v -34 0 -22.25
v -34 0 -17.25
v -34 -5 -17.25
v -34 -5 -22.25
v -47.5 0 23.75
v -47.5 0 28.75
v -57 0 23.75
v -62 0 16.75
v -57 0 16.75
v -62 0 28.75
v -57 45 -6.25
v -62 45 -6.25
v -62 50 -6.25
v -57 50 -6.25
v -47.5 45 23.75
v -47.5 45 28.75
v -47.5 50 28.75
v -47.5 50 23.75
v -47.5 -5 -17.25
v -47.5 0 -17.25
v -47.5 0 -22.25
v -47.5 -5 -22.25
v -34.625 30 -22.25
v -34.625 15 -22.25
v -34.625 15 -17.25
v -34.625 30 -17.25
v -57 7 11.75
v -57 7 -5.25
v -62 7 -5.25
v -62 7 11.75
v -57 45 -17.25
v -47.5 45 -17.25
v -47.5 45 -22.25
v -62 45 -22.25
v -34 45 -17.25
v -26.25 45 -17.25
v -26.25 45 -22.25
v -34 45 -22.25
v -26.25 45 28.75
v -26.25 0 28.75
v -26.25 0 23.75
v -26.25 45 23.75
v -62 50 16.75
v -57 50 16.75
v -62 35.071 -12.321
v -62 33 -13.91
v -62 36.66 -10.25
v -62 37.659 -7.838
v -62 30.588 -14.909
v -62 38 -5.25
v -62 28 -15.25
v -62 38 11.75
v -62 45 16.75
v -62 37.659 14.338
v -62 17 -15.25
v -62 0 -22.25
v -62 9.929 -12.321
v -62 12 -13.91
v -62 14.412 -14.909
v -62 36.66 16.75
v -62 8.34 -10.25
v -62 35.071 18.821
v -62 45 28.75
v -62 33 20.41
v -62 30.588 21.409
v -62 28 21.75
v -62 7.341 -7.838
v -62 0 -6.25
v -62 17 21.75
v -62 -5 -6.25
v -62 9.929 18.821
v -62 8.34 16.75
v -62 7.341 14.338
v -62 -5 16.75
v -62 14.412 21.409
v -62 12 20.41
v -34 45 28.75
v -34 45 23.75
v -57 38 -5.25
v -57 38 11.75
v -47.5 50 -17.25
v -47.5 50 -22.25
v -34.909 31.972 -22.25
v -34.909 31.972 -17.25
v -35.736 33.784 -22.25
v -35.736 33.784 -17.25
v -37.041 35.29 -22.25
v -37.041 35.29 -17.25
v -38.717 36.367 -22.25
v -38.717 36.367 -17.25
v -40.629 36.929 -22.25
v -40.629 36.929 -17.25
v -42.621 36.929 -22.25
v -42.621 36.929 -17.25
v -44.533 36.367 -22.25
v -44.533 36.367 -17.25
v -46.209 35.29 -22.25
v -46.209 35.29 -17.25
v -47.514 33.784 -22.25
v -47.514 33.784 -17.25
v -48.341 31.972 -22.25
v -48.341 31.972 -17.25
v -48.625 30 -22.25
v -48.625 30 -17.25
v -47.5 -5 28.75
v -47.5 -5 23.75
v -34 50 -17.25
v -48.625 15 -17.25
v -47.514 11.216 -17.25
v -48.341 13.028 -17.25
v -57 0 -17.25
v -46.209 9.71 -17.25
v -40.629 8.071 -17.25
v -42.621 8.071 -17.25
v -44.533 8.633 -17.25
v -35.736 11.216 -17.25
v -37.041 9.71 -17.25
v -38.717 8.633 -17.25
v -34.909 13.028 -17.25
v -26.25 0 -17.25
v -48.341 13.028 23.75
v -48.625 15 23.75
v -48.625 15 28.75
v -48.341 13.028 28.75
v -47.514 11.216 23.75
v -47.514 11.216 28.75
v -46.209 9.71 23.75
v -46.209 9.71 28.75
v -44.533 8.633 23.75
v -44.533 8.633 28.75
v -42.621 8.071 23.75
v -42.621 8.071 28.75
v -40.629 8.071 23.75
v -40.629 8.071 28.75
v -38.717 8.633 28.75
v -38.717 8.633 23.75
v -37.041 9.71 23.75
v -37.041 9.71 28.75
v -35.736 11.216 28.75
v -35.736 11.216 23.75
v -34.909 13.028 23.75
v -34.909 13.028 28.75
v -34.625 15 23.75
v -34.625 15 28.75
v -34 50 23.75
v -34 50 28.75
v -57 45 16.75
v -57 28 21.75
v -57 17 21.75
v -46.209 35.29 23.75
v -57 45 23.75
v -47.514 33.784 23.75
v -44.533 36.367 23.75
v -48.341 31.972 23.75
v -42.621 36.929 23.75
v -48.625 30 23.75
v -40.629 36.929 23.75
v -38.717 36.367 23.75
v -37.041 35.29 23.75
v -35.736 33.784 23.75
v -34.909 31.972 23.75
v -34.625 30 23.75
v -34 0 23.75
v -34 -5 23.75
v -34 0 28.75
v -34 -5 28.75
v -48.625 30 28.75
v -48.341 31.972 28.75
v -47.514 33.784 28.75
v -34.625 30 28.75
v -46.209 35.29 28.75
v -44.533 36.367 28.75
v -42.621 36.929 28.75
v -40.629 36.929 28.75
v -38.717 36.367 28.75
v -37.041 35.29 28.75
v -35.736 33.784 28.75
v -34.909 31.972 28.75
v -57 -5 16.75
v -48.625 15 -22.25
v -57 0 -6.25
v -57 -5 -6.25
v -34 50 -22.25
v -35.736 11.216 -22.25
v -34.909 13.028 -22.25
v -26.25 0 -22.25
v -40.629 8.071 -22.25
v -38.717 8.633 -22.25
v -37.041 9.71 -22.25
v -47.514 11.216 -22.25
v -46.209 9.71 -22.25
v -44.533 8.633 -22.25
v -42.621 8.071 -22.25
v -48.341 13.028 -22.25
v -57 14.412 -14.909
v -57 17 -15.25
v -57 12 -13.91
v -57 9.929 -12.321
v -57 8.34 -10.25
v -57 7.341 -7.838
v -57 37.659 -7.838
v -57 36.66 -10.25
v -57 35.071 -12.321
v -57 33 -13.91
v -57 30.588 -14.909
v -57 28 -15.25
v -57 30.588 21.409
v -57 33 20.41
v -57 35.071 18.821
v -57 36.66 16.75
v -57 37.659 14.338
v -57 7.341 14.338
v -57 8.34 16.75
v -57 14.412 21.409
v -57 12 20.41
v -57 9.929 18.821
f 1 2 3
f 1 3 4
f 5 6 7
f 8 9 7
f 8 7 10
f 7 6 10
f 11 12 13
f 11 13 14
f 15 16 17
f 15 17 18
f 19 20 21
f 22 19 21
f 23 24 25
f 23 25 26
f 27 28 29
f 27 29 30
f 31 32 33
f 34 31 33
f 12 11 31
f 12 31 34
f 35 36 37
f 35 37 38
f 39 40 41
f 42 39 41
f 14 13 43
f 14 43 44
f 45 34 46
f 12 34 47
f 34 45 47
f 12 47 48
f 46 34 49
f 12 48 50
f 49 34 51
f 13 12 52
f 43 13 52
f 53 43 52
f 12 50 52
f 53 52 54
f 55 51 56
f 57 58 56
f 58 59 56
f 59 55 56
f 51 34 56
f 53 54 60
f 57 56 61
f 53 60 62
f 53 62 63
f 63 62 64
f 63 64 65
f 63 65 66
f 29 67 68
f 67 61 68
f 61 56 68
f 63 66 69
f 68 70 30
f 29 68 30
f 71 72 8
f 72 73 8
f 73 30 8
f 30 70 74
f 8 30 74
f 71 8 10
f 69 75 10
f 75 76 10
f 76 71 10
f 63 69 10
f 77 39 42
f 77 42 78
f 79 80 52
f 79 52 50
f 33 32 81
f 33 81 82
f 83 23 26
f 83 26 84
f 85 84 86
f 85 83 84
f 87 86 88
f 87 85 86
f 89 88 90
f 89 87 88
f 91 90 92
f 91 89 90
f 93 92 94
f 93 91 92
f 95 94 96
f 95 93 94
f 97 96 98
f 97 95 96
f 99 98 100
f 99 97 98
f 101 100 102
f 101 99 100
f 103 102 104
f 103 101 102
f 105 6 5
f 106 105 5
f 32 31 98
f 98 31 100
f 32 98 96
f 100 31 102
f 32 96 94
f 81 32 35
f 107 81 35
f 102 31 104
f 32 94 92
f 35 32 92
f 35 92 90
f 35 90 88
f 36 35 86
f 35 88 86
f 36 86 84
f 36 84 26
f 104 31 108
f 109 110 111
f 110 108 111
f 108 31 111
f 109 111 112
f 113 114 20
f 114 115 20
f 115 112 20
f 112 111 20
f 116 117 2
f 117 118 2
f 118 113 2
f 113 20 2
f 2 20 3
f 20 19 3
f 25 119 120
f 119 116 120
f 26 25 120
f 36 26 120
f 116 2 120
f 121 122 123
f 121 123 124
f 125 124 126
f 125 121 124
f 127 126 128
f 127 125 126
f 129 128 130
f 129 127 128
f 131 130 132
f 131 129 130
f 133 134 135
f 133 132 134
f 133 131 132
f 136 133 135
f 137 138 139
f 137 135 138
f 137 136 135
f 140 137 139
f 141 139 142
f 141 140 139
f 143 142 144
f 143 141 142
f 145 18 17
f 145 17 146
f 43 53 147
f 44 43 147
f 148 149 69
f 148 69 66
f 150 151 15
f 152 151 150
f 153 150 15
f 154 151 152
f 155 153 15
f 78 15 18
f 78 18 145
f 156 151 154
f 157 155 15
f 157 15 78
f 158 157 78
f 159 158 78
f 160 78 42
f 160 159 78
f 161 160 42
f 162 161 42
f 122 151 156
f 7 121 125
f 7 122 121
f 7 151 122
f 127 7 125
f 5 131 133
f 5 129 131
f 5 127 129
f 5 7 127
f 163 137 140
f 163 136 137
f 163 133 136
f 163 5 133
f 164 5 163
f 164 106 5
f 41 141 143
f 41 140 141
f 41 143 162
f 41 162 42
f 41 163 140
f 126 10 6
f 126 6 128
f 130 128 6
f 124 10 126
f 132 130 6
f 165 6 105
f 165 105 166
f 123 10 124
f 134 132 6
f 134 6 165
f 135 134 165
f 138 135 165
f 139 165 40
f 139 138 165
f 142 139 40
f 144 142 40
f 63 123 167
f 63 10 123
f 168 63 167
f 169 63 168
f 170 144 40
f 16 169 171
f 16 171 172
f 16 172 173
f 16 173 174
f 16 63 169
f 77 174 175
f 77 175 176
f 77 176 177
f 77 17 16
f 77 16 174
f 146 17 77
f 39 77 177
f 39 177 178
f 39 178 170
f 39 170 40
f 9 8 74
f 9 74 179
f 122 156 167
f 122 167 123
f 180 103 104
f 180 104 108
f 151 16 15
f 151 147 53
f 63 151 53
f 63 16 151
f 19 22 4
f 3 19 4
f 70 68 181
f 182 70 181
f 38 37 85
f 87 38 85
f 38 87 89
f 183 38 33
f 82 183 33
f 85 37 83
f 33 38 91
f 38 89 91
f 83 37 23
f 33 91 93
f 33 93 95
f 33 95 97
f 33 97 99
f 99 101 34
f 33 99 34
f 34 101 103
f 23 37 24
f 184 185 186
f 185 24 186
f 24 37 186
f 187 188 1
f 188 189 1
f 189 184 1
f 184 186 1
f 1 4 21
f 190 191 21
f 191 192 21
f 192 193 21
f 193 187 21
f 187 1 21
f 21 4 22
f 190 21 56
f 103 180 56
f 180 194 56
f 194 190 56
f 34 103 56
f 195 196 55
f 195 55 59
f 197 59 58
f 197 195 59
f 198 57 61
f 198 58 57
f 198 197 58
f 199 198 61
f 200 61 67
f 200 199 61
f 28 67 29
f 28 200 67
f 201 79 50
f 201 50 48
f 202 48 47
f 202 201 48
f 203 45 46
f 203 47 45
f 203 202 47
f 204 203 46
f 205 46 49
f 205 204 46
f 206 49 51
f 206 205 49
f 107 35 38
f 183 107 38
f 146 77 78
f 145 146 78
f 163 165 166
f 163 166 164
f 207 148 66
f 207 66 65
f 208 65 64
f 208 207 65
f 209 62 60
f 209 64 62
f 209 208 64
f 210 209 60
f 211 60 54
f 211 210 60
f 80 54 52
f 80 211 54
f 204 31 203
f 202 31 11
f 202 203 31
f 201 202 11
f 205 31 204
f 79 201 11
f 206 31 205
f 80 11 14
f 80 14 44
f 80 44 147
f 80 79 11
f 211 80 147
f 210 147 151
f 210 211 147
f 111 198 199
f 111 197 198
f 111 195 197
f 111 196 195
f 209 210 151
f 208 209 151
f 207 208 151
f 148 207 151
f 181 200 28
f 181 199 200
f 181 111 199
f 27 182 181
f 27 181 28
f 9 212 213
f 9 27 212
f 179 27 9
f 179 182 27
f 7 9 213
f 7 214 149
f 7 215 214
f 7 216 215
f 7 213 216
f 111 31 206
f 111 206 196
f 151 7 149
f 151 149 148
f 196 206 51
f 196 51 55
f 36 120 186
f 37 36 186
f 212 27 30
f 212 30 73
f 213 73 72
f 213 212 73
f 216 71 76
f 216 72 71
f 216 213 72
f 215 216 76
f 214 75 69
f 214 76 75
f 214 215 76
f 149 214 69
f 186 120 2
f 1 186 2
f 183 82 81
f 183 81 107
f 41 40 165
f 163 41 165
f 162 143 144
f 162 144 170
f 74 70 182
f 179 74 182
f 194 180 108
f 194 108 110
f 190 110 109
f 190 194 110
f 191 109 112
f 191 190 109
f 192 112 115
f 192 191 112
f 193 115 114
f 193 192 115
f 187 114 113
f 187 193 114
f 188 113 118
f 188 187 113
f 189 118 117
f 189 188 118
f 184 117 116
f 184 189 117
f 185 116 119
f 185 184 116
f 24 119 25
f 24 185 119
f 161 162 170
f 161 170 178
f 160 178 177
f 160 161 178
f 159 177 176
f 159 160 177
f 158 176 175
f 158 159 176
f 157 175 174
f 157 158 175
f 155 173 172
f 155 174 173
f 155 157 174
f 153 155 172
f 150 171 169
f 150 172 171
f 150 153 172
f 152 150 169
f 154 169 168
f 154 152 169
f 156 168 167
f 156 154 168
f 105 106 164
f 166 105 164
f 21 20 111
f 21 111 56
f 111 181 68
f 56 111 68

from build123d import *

# Parameters (mm, degrees)
ESQUISSE1_W                  = 52.5
ESQUISSE1_H                  = 57.5
ESQUISSE1_W_2                = 42.5
ESQUISSE1_H_2                = 47.5
EXTRU_MINCE1_DEPTH           = 20
ESQUISSE3_W                  = 6.75
ESQUISSE3_H                  = 41
ESQUISSE3_W_2                = 30.75
BOSS_EXTRU_1_DEPTH           = 45
ESQUISSE6_W                  = 5
ESQUISSE6_H                  = 23
ESQUISSE6_W_2                = 13.5
ESQUISSE6_H_2                = 5
BOSS_EXTRU_3_DEPTH           = 5
ENL_V_MAT_EXTRU_1_REACH      = 100.236
ESQUISSE2_R                  = 1.6
ENL_V_START                  = -3
ENL_V_MAT_EXTRU_2_DEPTH      = 3
CONG_1_R                     = 3
ENL_V_MAT_EXTRU_3_DEPTH      = 116.440731547
ENL_V_MAT_EXTRU_4_DEPTH      = 95.578010129
ENL_V_MAT_EXTRU_5_DEPTH      = 85.679173945
ENL_V_MAT_EXTRU_5_DEPTH_BACK = 85.679173945
ESQUISSE11_W                 = 64.25
ESQUISSE11_H                 = 72.384582196


with BuildPart() as part:
    # Esquisse1 → Extru.-Mince1 (new body)
    with BuildSketch(Plane(origin=(0, 0, 0), x_dir=(1, 0, 0), z_dir=(0, 1, 0))):
        Rectangle(ESQUISSE1_W, ESQUISSE1_H)
        Rectangle(ESQUISSE1_W_2, ESQUISSE1_H_2, mode=Mode.SUBTRACT)
    extrude(amount=EXTRU_MINCE1_DEPTH)

    # Esquisse3 → Boss.-Extru.1 (add)
    with BuildSketch(Plane.XZ):
        Polygon((26.25, 28.75), (38, 28.75), (38, -22.25), (21.25, -22.25), (21.25, 23.75), (-21.25, 23.75), (-21.25, -22.25), (-62, -22.25), (-62, 28.75), (-26.25, 28.75), (0, 28.75), align=None)
        with Locations((29.625, 3.25)):
            Rectangle(ESQUISSE3_W, ESQUISSE3_H, mode=Mode.SUBTRACT)
        with Locations((-41.625, 3.25)):
            Rectangle(ESQUISSE3_W_2, ESQUISSE3_H, mode=Mode.SUBTRACT)
    extrude(amount=-BOSS_EXTRU_1_DEPTH)

    # Esquisse6 → Boss.-Extru.3 (add)
    with BuildSketch(Plane(origin=(0, 45, 0), x_dir=(1, 0, 0), z_dir=(0, 1, 0))):
        with Locations((35.5, -5.25)):
            Rectangle(ESQUISSE6_W, ESQUISSE6_H)
        with Locations((16.25, -26.25)):
            Rectangle(ESQUISSE6_W_2, ESQUISSE6_H_2)
        with Locations((-12.25, -26.25)):
            Rectangle(ESQUISSE6_W_2, ESQUISSE6_H_2)
        with Locations((-40.75, -26.25)):
            Rectangle(ESQUISSE6_W_2, ESQUISSE6_H_2)
        with Locations((-40.75, 19.75)):
            Rectangle(ESQUISSE6_W_2, ESQUISSE6_H_2)
        with Locations((-59.5, -5.25)):
            Rectangle(ESQUISSE6_W, ESQUISSE6_H)
    boss_extru_3 = extrude(amount=BOSS_EXTRU_3_DEPTH)

    # Esquisse2 → Enlèv. mat.-Extru.1 (cut, up to next)
    with BuildSketch(Plane.XY.offset(28.75), mode=Mode.PRIVATE) as enl_v_mat_extru_1_sk1:
        with Locations((-15.5, 5.2)):
            Circle(ESQUISSE2_R)
    enl_v_mat_extru_1_tool1 = extrude(enl_v_mat_extru_1_sk1.sketch, amount=-ENL_V_MAT_EXTRU_1_REACH, mode=Mode.PRIVATE) & part.part
    # Esquisse2 → Enlèv. mat.-Extru.1 (cut, up to next)
    with BuildSketch(Plane.XY.offset(28.75), mode=Mode.PRIVATE) as enl_v_mat_extru_1_sk2:
        with Locations((15.5, 5.2)):
            Circle(ESQUISSE2_R)
    enl_v_mat_extru_1_tool2 = extrude(enl_v_mat_extru_1_sk2.sketch, amount=-ENL_V_MAT_EXTRU_1_REACH, mode=Mode.PRIVATE) & part.part
    # Esquisse2 → Enlèv. mat.-Extru.1 (cut, up to next)
    with BuildSketch(Plane.XY.offset(28.75), mode=Mode.PRIVATE) as enl_v_mat_extru_1_sk3:
        with Locations(Location((15.5, 34.8, 0), (0, 0, 180))):
            Circle(ESQUISSE2_R)
    enl_v_mat_extru_1_tool3 = extrude(enl_v_mat_extru_1_sk3.sketch, amount=-ENL_V_MAT_EXTRU_1_REACH, mode=Mode.PRIVATE) & part.part
    # Esquisse2 → Enlèv. mat.-Extru.1 (cut, up to next)
    with BuildSketch(Plane.XY.offset(28.75), mode=Mode.PRIVATE) as enl_v_mat_extru_1_sk4:
        with Locations(Location((-15.5, 34.8, 0), (0, 0, 180))):
            Circle(ESQUISSE2_R)
    enl_v_mat_extru_1_tool4 = extrude(enl_v_mat_extru_1_sk4.sketch, amount=-ENL_V_MAT_EXTRU_1_REACH, mode=Mode.PRIVATE) & part.part
    # Esquisse2 → Enlèv. mat.-Extru.1 (cut, up to next)
    with BuildSketch(Plane.XY.offset(28.75), mode=Mode.PRIVATE) as enl_v_mat_extru_1_sk5:
        with BuildLine():
            Line((2.65, 36.215870824), (2.65, 32.215870824))
            ThreePointArc((2.65, 32.215870824), (0, 7.5), (-2.65, 32.215870824))
            Line((-2.65, 32.215870824), (-2.65, 36.215870824))
            ThreePointArc((-2.65, 36.215870824), (0, 38.865870824), (2.65, 36.215870824))
        make_face()
    enl_v_mat_extru_1_tool5 = extrude(enl_v_mat_extru_1_sk5.sketch, amount=-ENL_V_MAT_EXTRU_1_REACH, mode=Mode.PRIVATE) & part.part
    add(enl_v_mat_extru_1_tool1.solids().sort_by_distance((-15.5, 5.2, 28.75))[0], mode=Mode.SUBTRACT)
    add(enl_v_mat_extru_1_tool2.solids().sort_by_distance((15.5, 5.2, 28.75))[0], mode=Mode.SUBTRACT)
    add(enl_v_mat_extru_1_tool3.solids().sort_by_distance((15.5, 34.8, 28.75))[0], mode=Mode.SUBTRACT)
    add(enl_v_mat_extru_1_tool4.solids().sort_by_distance((-15.5, 34.8, 28.75))[0], mode=Mode.SUBTRACT)
    add(enl_v_mat_extru_1_tool5.solids().sort_by_distance((0, 20.91985, 28.75))[0], mode=Mode.SUBTRACT)

    # Esquisse4 → Enlèv. mat.-Extru.2 (cut)
    with BuildSketch(Plane(origin=(0, 0, 23.75), x_dir=(-1, 0, 0), z_dir=(0, 0, -1)).offset(ENL_V_START)):
        with BuildLine():
            Line((-12.5, 20), (-12.5, 50))
            Line((-12.5, 50), (12.5, 50))
            Line((12.5, 50), (12.5, 20))
            ThreePointArc((12.5, 20), (0, 32.5), (-12.5, 20))
        make_face()
    extrude(amount=ENL_V_MAT_EXTRU_2_DEPTH, mode=Mode.SUBTRACT)

    # Symétrie1: Boss.-Extru.3 across plane
    add(boss_extru_3.mirror(Plane(origin=(0, 22.5, 0), x_dir=(0, 0, 1), z_dir=(0, -1, 0))))

    # Congé1
    cong_1_edges = [part.edges().sort_by_distance(p)[0] for p in [
        (0, 20, -23.75),
    ]]
    fillet(cong_1_edges, radius=CONG_1_R)

    # Esquisse7 → Enlèv. mat.-Extru.3 (cut, through all)
    with BuildSketch(Plane(origin=(38, 0, 0), x_dir=(0, 0, -1), z_dir=(1, 0, 0))):
        with BuildLine():
            Line((-11.75, 38), (5.25, 38))
            ThreePointArc((5.25, 38), (12.321067812, 35.071067812), (15.25, 28))
            Line((15.25, 28), (15.25, 17))
            ThreePointArc((15.25, 17), (12.321067812, 9.928932188), (5.25, 7))
            Line((5.25, 7), (-11.75, 7))
            ThreePointArc((-11.75, 7), (-18.821067812, 9.928932188), (-21.75, 17))
            Line((-21.75, 17), (-21.75, 28))
            ThreePointArc((-21.75, 28), (-18.821067812, 35.071067812), (-11.75, 38))
        make_face()
    extrude(amount=-ENL_V_MAT_EXTRU_3_DEPTH, mode=Mode.SUBTRACT)

    # Esquisse8 → Enlèv. mat.-Extru.4 (cut, through all)
    with BuildSketch(Plane(origin=(0, 0, -22.25), x_dir=(-1, 0, 0), z_dir=(0, 0, -1))):
        with BuildLine():
            Line((48.625, 30), (48.625, 15))
            ThreePointArc((48.625, 15), (41.625, 8), (34.625, 15))
            Line((34.625, 15), (34.625, 30))
            ThreePointArc((34.625, 30), (41.625, 37), (48.625, 30))
        make_face()
    extrude(amount=-ENL_V_MAT_EXTRU_4_DEPTH, mode=Mode.SUBTRACT)

    # Esquisse11 → Enlèv. mat.-Extru.5 (cut, two sides: drawn at the far end of the back side and taken through both)
    with BuildSketch(Plane(origin=(0, 45, 0), x_dir=(1, 0, 0), z_dir=(0, 1, 0)).offset(-ENL_V_MAT_EXTRU_5_DEPTH_BACK)):
        with Locations((5.875, 7.442291098)):
            Rectangle(ESQUISSE11_W, ESQUISSE11_H)
    extrude(amount=ENL_V_MAT_EXTRU_5_DEPTH + ENL_V_MAT_EXTRU_5_DEPTH_BACK, mode=Mode.SUBTRACT)


solid = part.part
